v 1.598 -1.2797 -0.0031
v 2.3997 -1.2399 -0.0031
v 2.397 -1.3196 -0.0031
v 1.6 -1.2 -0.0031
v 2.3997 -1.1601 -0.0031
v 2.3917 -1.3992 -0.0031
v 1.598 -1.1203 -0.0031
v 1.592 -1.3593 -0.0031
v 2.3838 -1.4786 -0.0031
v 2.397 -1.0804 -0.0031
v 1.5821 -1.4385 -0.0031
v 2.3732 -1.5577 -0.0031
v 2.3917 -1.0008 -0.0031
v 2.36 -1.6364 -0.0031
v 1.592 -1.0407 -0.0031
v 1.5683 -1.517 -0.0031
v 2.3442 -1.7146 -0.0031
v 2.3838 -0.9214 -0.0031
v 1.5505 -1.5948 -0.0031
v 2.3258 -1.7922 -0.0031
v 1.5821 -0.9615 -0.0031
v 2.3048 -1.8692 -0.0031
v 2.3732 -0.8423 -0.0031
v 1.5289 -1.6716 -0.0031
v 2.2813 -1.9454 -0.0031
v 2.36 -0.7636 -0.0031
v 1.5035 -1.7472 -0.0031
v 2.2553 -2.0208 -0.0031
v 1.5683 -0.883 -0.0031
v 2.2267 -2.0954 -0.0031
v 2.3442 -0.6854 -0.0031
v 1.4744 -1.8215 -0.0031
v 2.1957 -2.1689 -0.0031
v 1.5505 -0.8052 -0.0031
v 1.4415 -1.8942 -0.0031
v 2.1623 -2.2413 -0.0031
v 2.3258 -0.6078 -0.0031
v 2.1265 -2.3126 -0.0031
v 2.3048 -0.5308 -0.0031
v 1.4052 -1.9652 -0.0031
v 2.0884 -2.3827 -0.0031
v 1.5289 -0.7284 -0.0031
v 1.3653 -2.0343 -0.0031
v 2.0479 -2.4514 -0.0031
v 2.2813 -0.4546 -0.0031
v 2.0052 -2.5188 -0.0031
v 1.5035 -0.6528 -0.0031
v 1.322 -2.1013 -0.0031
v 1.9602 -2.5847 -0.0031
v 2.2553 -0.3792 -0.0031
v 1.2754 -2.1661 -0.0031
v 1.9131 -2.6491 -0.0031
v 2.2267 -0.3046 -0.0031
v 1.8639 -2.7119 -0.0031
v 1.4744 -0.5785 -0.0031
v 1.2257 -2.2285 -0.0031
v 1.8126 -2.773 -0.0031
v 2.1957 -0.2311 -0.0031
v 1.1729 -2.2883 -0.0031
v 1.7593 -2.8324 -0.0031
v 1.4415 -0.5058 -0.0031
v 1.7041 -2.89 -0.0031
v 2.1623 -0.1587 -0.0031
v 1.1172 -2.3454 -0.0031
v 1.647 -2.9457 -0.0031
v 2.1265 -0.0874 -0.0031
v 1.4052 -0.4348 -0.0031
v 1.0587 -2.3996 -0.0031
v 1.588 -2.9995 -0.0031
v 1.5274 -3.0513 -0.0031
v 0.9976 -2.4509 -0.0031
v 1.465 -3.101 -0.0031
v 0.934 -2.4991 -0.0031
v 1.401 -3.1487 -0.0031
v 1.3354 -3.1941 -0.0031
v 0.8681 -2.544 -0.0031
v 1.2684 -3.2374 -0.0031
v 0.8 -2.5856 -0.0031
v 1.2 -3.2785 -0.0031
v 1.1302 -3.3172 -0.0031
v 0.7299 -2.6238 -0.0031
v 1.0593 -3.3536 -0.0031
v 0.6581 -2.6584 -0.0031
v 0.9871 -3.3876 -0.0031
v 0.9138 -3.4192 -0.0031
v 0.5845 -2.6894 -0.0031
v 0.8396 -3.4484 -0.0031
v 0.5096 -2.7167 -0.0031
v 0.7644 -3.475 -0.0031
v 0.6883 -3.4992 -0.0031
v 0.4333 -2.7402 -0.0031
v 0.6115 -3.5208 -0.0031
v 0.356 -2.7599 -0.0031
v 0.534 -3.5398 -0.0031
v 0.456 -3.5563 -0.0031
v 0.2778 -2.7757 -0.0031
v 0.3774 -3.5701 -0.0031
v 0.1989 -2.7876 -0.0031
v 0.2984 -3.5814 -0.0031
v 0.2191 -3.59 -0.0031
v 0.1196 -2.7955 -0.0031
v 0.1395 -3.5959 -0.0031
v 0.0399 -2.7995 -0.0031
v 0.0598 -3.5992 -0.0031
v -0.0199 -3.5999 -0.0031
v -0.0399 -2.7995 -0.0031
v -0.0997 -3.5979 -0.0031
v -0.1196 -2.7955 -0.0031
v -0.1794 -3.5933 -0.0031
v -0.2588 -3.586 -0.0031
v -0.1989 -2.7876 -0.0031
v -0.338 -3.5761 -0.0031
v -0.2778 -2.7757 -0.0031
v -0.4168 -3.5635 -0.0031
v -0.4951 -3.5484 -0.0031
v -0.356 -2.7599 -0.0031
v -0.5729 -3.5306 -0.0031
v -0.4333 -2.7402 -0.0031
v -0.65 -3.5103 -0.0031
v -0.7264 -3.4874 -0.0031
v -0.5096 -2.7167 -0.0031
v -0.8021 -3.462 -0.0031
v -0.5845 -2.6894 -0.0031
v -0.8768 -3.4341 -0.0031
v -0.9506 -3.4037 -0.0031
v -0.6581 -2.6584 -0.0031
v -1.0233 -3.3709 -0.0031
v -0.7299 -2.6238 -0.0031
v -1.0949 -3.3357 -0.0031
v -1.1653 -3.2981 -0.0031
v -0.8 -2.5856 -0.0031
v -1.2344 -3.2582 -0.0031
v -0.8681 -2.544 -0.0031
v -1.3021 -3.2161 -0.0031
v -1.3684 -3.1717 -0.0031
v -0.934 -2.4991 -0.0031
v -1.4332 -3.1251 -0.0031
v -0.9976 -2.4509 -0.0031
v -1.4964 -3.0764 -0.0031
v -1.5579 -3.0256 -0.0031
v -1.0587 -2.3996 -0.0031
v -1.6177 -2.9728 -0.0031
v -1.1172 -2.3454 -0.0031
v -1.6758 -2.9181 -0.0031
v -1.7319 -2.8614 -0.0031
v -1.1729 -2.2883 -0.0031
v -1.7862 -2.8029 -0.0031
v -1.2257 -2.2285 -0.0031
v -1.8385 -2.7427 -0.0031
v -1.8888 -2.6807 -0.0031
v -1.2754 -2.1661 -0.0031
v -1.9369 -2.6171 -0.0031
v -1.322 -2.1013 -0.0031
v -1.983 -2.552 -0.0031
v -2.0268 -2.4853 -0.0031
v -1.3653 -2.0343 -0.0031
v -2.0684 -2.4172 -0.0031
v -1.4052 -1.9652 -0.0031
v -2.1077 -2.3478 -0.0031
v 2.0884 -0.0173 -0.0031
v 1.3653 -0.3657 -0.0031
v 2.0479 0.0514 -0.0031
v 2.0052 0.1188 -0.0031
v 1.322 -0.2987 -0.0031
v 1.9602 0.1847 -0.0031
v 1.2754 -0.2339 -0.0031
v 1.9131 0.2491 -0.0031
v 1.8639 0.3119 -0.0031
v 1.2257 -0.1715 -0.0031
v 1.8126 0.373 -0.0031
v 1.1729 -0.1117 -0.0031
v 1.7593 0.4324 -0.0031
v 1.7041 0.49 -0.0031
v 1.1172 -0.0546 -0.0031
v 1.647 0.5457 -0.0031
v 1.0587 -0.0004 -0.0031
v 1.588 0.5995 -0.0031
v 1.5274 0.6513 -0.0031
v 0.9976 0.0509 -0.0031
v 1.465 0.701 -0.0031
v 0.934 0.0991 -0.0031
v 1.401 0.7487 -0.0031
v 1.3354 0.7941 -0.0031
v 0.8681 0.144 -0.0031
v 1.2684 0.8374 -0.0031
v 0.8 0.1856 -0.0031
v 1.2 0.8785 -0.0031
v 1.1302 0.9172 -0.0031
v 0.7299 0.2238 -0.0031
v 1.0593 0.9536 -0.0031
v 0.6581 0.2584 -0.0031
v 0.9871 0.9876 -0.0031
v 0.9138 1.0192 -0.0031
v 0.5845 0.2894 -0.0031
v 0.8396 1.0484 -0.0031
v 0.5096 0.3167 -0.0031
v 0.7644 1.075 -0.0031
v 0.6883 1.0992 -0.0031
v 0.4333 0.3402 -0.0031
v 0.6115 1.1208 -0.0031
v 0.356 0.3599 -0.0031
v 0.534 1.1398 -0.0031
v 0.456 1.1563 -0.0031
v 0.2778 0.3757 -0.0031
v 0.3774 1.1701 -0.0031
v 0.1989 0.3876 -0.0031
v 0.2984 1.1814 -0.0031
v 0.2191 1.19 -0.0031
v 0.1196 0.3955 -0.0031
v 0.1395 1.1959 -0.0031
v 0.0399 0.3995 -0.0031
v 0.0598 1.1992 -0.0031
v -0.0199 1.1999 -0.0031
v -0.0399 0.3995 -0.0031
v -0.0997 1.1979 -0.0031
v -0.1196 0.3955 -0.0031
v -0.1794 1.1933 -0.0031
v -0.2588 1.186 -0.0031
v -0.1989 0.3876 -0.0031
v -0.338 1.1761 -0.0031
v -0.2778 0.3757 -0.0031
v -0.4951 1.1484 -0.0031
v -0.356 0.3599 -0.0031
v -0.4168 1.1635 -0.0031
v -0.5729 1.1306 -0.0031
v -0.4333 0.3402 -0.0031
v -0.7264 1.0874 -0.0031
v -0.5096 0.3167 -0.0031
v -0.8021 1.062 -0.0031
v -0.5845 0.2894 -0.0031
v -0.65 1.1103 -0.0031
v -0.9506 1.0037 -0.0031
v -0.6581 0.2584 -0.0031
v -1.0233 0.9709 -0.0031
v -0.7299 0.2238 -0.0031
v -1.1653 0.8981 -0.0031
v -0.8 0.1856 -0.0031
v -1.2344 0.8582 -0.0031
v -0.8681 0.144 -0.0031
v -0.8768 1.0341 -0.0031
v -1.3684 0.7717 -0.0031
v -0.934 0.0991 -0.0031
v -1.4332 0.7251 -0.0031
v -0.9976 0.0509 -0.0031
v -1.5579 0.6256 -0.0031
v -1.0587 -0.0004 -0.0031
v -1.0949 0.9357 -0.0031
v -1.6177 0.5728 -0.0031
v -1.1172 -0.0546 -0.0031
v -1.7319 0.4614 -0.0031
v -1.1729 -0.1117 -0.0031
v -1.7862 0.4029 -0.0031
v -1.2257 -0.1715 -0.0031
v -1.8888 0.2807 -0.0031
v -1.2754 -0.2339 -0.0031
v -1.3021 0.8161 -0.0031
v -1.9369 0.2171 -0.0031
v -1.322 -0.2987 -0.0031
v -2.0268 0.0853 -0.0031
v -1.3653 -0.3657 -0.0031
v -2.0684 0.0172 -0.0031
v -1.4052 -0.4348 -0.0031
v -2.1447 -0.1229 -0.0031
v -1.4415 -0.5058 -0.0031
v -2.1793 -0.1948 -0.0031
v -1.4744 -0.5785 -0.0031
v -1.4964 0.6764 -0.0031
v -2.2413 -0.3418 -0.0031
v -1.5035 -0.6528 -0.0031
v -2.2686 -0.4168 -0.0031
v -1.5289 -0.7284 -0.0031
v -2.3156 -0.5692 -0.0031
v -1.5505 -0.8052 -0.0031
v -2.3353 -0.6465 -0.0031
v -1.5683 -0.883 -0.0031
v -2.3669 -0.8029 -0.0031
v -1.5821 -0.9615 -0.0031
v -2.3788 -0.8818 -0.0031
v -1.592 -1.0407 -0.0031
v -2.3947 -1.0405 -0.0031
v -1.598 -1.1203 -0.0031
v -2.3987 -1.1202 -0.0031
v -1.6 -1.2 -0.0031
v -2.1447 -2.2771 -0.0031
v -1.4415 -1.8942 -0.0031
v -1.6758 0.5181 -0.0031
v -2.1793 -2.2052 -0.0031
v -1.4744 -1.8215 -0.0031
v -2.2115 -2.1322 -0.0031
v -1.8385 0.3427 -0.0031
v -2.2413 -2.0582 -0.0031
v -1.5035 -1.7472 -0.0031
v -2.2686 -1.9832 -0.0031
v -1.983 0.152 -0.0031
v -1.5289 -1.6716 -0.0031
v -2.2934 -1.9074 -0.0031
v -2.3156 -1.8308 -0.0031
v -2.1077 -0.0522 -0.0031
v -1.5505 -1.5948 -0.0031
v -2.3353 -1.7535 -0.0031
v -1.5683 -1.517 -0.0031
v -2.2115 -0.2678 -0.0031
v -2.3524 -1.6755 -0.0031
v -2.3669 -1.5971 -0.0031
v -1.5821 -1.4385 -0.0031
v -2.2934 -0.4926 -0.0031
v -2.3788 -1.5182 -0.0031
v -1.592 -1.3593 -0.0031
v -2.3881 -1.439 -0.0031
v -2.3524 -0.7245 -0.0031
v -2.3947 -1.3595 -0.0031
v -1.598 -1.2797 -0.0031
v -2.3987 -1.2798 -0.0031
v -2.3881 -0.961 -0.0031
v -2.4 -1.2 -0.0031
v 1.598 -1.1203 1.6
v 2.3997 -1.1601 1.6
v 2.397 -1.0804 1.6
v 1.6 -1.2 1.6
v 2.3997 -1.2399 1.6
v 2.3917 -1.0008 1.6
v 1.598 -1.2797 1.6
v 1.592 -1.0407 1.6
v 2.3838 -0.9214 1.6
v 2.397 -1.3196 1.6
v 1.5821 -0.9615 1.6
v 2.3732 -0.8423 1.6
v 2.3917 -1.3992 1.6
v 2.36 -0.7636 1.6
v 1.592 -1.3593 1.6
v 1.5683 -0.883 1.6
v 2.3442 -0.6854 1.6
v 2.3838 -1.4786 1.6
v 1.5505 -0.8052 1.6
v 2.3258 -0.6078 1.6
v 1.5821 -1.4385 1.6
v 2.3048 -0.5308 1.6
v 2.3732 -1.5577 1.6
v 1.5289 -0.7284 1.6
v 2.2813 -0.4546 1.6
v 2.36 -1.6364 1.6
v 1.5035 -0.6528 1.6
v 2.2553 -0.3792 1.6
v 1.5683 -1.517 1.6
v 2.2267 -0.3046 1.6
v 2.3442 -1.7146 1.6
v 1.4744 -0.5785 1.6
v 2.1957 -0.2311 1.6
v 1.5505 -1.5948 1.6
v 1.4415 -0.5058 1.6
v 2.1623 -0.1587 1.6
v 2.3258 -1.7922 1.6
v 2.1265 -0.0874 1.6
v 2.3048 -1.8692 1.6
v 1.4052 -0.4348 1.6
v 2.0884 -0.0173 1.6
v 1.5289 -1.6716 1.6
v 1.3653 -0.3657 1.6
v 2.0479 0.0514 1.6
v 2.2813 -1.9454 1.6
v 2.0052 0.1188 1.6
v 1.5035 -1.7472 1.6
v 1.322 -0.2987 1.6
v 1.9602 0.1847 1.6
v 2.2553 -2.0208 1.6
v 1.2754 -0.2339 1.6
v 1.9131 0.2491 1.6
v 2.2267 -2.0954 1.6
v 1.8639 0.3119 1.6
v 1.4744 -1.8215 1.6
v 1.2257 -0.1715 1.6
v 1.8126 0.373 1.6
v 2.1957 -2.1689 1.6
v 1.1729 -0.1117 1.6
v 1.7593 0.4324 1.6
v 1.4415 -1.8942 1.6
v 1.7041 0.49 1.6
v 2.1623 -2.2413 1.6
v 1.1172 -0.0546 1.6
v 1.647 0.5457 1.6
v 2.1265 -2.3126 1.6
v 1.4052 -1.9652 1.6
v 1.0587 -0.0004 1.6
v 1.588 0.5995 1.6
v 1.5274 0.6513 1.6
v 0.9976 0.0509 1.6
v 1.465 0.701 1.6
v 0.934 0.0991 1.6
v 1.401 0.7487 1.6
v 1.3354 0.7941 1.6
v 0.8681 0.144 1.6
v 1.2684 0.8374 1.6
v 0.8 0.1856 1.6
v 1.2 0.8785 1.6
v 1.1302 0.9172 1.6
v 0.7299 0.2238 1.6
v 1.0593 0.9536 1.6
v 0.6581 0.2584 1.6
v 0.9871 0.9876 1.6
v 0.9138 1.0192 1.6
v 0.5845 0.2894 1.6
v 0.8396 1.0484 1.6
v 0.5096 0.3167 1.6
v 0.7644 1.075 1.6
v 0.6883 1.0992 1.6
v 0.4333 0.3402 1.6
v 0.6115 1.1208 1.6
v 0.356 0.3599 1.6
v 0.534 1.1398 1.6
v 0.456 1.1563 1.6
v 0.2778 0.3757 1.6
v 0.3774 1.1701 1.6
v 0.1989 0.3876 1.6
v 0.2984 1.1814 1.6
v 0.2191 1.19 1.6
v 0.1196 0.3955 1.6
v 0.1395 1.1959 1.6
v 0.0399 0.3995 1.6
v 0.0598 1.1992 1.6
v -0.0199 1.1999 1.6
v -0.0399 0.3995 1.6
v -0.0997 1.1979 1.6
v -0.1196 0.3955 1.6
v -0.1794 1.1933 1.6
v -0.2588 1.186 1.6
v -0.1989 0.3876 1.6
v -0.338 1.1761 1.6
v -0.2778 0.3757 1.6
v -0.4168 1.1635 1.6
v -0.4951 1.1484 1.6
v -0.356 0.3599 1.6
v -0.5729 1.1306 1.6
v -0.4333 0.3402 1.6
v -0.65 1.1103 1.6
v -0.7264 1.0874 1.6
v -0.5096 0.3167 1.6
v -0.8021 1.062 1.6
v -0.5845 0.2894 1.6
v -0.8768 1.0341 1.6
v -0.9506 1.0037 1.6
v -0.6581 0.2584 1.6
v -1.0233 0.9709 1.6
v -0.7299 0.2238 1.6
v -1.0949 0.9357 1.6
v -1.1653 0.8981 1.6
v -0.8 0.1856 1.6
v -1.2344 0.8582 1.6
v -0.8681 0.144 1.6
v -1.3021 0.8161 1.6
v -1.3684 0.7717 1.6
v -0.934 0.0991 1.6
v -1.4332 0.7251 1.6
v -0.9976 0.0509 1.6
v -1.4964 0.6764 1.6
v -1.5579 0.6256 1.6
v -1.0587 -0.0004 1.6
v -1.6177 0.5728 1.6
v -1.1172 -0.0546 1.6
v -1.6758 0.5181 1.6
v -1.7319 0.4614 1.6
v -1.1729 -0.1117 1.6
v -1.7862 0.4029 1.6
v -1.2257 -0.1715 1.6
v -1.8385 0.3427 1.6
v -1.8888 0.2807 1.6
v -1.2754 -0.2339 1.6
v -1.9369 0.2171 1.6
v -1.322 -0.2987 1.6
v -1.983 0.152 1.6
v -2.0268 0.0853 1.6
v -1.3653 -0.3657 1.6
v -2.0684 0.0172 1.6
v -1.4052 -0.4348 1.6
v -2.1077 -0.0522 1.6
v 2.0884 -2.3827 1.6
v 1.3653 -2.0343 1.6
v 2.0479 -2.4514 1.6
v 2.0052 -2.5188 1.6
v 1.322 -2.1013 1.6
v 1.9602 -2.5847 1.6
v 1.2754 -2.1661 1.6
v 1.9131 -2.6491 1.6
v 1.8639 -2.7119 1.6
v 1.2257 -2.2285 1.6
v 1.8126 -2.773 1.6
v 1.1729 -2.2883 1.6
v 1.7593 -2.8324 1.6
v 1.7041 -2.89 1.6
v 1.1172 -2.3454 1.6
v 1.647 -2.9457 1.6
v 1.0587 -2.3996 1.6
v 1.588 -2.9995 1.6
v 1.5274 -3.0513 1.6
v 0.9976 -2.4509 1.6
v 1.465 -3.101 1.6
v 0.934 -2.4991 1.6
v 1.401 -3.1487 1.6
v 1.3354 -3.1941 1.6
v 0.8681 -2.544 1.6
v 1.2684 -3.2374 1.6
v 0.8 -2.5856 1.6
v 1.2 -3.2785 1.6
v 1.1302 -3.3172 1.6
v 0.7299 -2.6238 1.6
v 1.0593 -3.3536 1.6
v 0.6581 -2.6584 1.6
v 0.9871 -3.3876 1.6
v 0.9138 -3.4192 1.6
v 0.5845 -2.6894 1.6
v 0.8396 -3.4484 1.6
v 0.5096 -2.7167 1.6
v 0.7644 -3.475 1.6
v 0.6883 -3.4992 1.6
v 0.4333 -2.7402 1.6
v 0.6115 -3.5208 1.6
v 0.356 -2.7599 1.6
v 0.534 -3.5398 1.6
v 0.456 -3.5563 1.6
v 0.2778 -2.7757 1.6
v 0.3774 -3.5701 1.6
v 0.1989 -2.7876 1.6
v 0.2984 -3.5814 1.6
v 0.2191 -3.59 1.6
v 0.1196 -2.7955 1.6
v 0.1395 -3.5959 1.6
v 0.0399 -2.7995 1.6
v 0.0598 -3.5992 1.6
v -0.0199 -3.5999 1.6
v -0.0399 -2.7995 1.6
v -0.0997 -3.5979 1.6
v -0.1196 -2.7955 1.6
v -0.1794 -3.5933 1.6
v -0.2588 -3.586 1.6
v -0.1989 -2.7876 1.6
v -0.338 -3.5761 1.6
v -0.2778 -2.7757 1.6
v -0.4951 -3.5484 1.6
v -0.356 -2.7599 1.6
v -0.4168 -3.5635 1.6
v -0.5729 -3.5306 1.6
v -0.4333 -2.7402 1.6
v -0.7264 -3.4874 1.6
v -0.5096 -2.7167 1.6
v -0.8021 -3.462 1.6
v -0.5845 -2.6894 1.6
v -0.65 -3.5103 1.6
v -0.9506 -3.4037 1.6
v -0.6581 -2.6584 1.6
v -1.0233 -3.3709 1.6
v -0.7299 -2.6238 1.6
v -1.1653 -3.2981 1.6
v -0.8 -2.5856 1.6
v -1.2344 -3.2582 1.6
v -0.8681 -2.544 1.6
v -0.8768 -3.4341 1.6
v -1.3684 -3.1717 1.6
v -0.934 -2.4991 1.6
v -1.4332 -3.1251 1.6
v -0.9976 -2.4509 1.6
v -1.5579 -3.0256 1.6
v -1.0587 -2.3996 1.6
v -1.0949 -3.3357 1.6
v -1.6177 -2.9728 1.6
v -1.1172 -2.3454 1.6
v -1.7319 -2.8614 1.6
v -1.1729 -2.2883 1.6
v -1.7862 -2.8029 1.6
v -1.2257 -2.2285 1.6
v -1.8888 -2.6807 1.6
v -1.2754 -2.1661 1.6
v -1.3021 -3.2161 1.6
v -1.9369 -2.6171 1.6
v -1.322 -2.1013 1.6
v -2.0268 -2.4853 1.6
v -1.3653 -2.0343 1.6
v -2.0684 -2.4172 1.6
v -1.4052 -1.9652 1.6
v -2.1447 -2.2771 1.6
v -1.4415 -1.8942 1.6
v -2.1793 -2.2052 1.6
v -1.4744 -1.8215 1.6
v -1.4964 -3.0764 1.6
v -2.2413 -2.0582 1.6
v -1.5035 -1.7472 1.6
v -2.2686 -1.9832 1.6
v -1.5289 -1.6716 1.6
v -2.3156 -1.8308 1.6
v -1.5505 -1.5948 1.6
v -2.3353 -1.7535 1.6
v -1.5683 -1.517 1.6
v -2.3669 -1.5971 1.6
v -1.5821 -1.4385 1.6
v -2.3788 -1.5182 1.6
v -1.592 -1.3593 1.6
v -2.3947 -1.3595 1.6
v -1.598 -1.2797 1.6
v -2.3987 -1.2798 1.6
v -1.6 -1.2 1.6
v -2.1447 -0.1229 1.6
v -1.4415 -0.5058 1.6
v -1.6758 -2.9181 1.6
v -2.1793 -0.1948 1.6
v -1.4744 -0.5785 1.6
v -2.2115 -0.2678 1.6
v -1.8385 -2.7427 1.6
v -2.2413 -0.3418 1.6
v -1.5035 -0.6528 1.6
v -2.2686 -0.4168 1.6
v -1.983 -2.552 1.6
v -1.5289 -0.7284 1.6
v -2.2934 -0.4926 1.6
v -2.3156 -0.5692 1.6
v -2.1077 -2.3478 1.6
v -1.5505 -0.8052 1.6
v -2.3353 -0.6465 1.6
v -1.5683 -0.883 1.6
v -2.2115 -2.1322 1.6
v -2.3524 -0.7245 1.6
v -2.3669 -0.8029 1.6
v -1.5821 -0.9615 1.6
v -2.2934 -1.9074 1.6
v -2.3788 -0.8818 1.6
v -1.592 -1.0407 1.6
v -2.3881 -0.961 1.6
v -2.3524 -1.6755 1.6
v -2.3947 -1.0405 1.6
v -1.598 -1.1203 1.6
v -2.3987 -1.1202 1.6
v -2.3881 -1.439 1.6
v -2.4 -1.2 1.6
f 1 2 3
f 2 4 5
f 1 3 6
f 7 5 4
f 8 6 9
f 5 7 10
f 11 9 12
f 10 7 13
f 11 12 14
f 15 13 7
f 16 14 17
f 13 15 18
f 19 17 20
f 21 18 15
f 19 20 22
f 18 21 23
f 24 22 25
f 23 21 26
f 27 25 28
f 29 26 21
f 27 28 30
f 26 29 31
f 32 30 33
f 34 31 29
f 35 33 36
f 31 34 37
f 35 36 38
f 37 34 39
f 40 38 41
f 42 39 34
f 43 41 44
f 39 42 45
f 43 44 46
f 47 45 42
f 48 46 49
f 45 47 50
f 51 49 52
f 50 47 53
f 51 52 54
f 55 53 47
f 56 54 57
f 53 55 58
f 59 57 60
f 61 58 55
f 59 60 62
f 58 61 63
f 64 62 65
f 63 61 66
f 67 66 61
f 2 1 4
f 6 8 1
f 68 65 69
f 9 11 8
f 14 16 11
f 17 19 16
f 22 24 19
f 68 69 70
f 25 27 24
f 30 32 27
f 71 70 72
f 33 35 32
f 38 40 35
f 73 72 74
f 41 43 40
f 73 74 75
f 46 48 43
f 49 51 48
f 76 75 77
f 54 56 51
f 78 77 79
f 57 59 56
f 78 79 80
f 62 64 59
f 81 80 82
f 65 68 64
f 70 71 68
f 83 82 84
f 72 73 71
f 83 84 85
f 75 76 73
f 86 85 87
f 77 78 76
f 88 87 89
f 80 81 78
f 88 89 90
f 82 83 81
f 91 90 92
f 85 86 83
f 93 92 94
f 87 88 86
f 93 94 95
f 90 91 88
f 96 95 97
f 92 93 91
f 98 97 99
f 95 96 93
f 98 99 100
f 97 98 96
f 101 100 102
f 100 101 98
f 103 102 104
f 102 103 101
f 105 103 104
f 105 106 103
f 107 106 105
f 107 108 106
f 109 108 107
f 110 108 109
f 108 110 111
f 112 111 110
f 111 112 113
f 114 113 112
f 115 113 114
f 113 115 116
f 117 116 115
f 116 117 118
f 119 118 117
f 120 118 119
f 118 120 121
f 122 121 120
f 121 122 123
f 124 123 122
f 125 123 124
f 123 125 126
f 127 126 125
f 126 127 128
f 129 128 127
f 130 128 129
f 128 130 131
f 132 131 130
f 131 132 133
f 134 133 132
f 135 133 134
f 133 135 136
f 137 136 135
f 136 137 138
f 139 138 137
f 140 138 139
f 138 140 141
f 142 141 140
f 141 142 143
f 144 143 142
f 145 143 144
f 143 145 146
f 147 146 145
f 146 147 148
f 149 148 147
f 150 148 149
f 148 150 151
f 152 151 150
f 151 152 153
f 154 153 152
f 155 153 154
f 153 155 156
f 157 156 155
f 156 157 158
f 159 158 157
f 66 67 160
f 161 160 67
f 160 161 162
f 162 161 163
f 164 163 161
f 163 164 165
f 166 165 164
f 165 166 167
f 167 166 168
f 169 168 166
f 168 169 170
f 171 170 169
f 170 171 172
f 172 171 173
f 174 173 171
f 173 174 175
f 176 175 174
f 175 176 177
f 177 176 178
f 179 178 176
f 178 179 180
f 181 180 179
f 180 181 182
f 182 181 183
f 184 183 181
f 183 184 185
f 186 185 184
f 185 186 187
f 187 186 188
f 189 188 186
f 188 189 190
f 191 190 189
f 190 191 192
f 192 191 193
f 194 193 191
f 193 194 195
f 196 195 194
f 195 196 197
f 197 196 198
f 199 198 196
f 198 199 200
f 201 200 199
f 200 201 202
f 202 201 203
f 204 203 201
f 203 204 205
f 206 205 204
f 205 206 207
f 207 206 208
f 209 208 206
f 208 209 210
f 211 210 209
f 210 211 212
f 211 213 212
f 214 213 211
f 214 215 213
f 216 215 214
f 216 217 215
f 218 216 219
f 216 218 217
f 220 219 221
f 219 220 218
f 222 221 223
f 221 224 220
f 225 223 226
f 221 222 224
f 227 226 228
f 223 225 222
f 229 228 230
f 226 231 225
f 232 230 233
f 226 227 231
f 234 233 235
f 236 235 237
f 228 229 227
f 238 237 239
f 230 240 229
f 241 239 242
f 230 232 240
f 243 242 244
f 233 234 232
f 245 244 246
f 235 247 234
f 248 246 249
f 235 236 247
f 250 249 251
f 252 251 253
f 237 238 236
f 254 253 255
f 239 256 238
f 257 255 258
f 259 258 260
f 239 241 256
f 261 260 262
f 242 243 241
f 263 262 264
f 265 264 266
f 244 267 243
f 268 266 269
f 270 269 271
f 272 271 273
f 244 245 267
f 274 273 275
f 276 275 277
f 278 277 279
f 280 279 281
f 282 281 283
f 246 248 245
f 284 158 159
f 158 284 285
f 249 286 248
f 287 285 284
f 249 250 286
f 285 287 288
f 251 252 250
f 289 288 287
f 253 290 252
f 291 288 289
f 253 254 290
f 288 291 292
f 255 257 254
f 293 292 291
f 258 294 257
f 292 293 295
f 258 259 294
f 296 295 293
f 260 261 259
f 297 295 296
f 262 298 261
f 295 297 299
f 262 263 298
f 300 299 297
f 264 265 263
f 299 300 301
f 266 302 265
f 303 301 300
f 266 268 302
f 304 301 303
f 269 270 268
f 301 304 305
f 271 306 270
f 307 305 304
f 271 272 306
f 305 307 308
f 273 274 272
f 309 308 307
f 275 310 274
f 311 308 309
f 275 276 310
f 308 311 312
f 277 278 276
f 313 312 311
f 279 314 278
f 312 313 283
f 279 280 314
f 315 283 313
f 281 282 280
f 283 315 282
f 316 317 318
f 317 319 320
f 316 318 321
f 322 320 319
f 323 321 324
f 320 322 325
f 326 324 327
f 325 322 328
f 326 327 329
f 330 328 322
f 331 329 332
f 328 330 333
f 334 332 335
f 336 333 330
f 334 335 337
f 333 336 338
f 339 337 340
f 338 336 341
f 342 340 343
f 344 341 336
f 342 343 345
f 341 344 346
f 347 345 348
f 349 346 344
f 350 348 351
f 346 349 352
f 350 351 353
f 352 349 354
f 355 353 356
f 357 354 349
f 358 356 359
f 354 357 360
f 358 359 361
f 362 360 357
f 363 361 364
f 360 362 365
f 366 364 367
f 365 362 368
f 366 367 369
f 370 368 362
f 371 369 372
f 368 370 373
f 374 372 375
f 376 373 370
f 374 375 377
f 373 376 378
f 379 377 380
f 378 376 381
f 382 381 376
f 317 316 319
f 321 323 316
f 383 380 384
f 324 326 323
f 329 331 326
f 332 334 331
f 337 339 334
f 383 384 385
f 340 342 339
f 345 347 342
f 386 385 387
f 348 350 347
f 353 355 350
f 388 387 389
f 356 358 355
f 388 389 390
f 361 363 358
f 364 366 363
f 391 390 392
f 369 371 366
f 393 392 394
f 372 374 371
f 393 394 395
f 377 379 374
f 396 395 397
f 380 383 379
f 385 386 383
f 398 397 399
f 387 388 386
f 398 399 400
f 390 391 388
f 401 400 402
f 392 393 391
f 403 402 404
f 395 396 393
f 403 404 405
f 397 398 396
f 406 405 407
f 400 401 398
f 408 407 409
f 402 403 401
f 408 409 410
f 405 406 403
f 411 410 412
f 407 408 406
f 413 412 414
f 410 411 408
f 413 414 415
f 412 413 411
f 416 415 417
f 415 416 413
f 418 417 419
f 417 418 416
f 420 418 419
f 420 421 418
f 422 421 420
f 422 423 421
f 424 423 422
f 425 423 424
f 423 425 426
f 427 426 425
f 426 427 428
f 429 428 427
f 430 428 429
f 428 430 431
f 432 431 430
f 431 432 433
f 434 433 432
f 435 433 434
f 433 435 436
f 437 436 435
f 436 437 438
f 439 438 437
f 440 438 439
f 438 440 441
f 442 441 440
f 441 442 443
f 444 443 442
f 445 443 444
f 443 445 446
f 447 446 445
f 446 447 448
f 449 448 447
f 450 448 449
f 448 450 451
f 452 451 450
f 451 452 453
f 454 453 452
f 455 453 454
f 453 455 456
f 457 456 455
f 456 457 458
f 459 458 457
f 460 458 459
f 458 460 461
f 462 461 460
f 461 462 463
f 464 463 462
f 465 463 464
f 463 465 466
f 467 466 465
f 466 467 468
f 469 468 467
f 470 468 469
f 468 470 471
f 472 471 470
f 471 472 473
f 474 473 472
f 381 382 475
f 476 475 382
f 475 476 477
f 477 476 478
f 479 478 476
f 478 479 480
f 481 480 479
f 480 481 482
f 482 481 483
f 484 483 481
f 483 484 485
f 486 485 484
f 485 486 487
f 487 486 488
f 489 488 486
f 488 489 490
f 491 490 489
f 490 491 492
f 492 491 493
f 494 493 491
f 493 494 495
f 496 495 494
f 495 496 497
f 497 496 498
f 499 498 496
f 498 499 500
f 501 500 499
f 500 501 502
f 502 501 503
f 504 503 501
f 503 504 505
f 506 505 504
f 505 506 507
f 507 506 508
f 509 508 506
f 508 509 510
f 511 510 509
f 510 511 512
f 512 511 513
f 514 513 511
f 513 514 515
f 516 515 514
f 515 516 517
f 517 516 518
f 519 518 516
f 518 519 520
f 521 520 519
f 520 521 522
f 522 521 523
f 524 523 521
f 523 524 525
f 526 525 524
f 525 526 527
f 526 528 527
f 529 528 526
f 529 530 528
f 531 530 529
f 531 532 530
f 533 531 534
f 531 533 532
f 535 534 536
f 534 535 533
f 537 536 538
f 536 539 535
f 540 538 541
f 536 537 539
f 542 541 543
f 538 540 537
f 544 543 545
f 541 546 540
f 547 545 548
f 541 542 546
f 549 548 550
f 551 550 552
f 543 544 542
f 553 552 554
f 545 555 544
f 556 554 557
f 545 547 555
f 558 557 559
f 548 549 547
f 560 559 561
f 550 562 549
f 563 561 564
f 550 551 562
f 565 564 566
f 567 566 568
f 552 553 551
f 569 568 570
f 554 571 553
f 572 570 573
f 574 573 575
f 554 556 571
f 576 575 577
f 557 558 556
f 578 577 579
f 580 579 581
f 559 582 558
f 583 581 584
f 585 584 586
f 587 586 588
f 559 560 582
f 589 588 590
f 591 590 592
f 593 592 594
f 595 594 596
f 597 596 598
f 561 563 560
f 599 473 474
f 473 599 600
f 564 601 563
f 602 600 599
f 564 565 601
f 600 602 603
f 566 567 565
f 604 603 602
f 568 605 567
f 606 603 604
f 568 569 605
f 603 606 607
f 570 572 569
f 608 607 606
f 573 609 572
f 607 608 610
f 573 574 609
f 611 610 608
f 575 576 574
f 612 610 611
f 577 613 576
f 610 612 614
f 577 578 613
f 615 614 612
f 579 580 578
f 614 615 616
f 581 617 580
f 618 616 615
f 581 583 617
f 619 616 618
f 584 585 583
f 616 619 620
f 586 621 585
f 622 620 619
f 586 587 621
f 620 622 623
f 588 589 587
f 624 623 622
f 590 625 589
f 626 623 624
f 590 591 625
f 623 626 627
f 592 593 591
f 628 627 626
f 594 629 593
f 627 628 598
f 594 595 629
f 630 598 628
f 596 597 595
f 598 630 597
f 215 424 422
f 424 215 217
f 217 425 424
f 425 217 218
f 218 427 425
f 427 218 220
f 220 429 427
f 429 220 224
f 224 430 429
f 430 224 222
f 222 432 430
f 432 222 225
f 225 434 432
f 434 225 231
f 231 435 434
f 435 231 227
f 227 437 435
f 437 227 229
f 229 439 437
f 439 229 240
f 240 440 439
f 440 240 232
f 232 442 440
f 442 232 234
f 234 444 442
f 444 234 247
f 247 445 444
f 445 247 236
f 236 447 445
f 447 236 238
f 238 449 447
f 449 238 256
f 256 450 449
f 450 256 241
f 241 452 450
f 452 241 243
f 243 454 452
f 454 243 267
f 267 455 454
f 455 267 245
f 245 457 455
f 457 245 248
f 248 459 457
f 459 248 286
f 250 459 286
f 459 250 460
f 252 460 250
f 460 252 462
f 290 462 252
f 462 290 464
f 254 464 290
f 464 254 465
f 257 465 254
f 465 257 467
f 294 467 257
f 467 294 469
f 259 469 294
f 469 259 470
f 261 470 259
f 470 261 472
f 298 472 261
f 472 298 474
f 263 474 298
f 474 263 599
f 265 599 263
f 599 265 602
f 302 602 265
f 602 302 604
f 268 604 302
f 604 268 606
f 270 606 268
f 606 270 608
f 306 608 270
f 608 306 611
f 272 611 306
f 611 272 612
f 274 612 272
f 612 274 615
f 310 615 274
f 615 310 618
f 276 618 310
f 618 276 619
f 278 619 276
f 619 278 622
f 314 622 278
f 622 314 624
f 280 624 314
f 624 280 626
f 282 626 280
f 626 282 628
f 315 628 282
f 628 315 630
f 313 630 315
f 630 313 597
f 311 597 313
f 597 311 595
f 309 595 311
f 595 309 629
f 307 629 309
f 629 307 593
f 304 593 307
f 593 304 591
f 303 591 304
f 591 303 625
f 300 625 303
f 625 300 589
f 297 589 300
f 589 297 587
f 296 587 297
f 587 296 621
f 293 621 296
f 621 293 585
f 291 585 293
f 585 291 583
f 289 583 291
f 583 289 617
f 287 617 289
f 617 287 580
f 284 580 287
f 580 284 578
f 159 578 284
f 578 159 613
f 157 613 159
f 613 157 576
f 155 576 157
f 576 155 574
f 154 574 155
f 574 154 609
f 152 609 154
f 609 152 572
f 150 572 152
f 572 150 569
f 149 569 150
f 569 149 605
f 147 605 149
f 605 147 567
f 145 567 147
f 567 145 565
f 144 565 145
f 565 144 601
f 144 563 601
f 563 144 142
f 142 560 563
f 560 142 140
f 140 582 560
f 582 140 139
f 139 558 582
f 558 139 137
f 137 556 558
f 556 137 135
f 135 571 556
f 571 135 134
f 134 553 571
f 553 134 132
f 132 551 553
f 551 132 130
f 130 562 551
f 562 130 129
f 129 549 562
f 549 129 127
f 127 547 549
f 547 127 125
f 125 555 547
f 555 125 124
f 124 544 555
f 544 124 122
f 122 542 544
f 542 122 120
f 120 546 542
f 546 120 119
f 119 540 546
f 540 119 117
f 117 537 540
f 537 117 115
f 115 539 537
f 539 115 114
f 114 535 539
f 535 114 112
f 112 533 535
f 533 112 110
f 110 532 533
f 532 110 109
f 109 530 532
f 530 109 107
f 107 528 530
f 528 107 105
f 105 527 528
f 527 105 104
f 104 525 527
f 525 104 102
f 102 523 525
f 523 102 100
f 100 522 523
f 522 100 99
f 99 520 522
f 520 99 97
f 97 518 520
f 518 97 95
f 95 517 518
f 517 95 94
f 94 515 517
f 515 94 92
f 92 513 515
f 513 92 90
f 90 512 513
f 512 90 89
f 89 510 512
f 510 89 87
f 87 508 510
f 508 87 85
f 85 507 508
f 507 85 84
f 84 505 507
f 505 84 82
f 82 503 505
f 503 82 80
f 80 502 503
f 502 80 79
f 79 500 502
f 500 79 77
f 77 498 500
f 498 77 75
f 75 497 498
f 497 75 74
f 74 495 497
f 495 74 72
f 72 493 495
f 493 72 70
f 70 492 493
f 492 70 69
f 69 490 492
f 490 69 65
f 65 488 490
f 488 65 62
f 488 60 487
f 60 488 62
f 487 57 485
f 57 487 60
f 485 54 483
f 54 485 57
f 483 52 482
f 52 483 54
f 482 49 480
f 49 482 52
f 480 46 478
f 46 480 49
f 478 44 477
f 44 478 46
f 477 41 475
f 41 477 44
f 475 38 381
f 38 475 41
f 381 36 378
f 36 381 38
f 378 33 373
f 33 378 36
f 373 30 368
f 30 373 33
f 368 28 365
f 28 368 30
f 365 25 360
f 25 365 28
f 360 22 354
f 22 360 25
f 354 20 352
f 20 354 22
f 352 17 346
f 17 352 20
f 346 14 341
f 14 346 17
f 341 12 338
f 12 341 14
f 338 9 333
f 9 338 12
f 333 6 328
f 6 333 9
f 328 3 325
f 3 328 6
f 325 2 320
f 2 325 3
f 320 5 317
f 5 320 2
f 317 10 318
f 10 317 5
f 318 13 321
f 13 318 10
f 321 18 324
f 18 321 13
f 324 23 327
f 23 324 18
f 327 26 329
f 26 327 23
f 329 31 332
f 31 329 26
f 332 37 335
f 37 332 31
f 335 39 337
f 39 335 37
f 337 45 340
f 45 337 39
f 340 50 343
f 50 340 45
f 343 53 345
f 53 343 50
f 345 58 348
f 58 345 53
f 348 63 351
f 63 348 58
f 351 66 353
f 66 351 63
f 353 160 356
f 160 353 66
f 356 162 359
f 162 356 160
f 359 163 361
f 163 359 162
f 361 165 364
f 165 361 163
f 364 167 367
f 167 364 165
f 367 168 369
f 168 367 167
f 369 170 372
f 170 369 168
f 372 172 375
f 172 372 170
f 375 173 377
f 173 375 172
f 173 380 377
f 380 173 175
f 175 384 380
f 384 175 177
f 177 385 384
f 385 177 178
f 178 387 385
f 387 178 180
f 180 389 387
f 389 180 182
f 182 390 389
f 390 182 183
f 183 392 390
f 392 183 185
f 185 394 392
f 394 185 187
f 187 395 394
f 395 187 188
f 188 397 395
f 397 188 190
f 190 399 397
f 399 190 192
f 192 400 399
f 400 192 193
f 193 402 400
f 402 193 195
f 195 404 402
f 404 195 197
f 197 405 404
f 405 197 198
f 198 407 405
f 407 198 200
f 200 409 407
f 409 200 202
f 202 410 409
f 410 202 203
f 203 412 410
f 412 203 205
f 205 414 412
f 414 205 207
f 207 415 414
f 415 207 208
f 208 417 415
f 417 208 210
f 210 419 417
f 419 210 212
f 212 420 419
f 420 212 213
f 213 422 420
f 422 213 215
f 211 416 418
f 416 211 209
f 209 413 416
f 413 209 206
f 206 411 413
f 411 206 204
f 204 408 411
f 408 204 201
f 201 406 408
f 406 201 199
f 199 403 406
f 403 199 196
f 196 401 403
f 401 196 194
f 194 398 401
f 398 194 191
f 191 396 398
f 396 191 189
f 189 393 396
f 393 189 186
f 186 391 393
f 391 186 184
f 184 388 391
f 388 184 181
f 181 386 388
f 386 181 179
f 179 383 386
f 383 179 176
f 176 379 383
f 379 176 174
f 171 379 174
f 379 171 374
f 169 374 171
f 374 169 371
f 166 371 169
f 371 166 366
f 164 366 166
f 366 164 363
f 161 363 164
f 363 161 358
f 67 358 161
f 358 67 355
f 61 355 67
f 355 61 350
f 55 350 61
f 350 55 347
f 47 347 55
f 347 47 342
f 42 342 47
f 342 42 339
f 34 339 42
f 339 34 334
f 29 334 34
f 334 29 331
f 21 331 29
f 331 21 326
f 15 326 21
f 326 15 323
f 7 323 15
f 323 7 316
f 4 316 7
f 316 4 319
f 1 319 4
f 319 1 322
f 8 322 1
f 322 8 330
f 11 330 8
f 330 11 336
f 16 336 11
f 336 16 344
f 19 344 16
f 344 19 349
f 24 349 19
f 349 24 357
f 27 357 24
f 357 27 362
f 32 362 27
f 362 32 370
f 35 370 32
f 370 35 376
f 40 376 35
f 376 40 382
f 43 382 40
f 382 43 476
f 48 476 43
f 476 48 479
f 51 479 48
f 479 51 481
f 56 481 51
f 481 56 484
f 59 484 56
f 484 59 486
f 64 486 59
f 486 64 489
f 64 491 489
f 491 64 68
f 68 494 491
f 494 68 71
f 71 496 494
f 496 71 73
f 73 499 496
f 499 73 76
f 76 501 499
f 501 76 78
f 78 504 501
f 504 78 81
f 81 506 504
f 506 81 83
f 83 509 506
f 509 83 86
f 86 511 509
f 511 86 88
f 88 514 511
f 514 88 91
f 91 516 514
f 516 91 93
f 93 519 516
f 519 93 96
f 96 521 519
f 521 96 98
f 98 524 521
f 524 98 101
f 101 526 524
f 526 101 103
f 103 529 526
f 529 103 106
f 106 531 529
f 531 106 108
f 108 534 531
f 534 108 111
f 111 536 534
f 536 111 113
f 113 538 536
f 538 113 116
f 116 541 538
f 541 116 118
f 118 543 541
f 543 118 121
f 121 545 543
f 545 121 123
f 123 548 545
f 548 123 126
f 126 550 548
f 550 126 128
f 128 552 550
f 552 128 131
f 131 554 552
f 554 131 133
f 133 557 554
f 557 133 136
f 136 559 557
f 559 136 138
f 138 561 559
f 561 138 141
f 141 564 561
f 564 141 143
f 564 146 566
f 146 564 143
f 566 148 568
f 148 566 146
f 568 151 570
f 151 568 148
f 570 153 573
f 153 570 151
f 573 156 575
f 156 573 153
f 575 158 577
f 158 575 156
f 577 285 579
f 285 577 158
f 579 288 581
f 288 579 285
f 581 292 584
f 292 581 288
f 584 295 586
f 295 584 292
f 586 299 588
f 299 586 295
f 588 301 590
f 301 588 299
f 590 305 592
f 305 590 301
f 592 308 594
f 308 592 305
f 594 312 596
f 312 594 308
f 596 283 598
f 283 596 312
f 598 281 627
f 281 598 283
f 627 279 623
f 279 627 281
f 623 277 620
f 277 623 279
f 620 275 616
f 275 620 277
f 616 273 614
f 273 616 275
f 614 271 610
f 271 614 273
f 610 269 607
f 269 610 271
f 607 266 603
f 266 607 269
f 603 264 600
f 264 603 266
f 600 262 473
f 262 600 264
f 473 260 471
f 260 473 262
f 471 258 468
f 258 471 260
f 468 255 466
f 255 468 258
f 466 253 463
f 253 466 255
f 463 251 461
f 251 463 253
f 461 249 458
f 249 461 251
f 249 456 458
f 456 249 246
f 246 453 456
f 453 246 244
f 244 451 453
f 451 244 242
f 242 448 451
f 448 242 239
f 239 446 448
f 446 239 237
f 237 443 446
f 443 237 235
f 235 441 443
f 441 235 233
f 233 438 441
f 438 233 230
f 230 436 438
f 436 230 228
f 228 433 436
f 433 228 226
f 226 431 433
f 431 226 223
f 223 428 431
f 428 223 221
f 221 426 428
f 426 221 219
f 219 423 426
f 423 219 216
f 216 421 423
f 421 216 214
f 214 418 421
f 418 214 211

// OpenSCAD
use <../lib.scad>
use <s/92198p01s03.scad>
use <s/92198p05s01.scad>
use <s/92198s01.scad>
$fa=1; $fs=0.2;
function ldraw_lib__92198p08(realsolid=false) = [
// 0 Figure Friends Female Head with Light Brown Eyes, Pink Lips and Closed Mouth Pattern
// 0 Name: 92198p08.dat
// 0 Author: Philippe Hurbain [Philo]
// 0 !LDRAW_ORG Part UPDATE 2014-02
// 0 !LICENSE Licensed under CC BY 2.0 and CC BY 4.0 : see CAreadme.txt
// 
// 0 BFC CERTIFY CCW
  [0,"BFC","CERTIFY"],
  [0,"BFC","CCW"],
// 
// 0 !KEYWORDS Danielle, Lily, Marie, Olivia, Theresa
// 
// 0 !HISTORY 2014-12-23 [PTadmin] Official Update 2014-02
// 
// 
// 1 16 0 0 0 1 0 0 0 1 0 0 0 1 s\92198s01.dat
  [1,16,0,0,0,1,0,0,0,1,0,0,0,1, ldraw_lib__s__92198s01(realsolid)],
// 1 16 0 0 0 1 0 0 0 1 0 0 0 1 s\92198p05s01.dat
  [1,16,0,0,0,1,0,0,0,1,0,0,0,1, ldraw_lib__s__92198p05s01(realsolid)],
// 1 450 0 0 0 1 0 0 0 1 0 0 0 1 s\92198p01s03.dat
  [1,450,0,0,0,1,0,0,0,1,0,0,0,1, ldraw_lib__s__92198p01s03(realsolid)],
// 3 16 4.511 15.296 -14.246 4.08 20.01 -14.07 5.25 15.35 -13.789
  [3,16,4.511,15.296,-14.246,4.08,20.01,-14.07,5.25,15.35,-13.789],
// 3 16 -5.25 15.35 -13.789 -4.08 20.01 -14.07 -4.511 15.296 -14.246
  [3,16,-5.25,15.35,-13.789,-4.08,20.01,-14.07,-4.511,15.296,-14.246],
// 4 16 9.32 14.31 -11.4 7.3 14.75 -12.593 6.8 15.05 -12.87 4.08 20.01 -14.07
  [4,16,9.32,14.31,-11.4,7.3,14.75,-12.593,6.8,15.05,-12.87,4.08,20.01,-14.07],
// 3 16 6.1 15.25 -13.279 5.25 15.35 -13.789 4.08 20.01 -14.07
  [3,16,6.1,15.25,-13.279,5.25,15.35,-13.789,4.08,20.01,-14.07],
// 3 16 6.8 15.05 -12.87 6.1 15.25 -13.279 4.08 20.01 -14.07
  [3,16,6.8,15.05,-12.87,6.1,15.25,-13.279,4.08,20.01,-14.07],
// 3 16 9.32 14.31 -11.4 4.08 20.01 -14.07 7.78 19.34 -11.69
  [3,16,9.32,14.31,-11.4,4.08,20.01,-14.07,7.78,19.34,-11.69],
// 4 16 -6.8 15.05 -12.87 -7.3 14.75 -12.593 -9.32 14.31 -11.4 -4.08 20.01 -14.07
  [4,16,-6.8,15.05,-12.87,-7.3,14.75,-12.593,-9.32,14.31,-11.4,-4.08,20.01,-14.07],
// 3 16 -4.08 20.01 -14.07 -5.25 15.35 -13.789 -6.1 15.25 -13.279
  [3,16,-4.08,20.01,-14.07,-5.25,15.35,-13.789,-6.1,15.25,-13.279],
// 3 16 -4.08 20.01 -14.07 -6.1 15.25 -13.279 -6.8 15.05 -12.87
  [3,16,-4.08,20.01,-14.07,-6.1,15.25,-13.279,-6.8,15.05,-12.87],
// 3 16 -7.78 19.34 -11.69 -4.08 20.01 -14.07 -9.32 14.31 -11.4
  [3,16,-7.78,19.34,-11.69,-4.08,20.01,-14.07,-9.32,14.31,-11.4],
];
module ldraw_lib__92198p08(step=0, col=false, unit=2/5, alt=false, line=0.2, solid=!$preview)
    makepoly(ldraw_lib__92198p08(solid), step=step, col=col, unit=unit, alt=alt, line=line, solid=solid);
ldraw_lib__92198p08(line=0.2);
